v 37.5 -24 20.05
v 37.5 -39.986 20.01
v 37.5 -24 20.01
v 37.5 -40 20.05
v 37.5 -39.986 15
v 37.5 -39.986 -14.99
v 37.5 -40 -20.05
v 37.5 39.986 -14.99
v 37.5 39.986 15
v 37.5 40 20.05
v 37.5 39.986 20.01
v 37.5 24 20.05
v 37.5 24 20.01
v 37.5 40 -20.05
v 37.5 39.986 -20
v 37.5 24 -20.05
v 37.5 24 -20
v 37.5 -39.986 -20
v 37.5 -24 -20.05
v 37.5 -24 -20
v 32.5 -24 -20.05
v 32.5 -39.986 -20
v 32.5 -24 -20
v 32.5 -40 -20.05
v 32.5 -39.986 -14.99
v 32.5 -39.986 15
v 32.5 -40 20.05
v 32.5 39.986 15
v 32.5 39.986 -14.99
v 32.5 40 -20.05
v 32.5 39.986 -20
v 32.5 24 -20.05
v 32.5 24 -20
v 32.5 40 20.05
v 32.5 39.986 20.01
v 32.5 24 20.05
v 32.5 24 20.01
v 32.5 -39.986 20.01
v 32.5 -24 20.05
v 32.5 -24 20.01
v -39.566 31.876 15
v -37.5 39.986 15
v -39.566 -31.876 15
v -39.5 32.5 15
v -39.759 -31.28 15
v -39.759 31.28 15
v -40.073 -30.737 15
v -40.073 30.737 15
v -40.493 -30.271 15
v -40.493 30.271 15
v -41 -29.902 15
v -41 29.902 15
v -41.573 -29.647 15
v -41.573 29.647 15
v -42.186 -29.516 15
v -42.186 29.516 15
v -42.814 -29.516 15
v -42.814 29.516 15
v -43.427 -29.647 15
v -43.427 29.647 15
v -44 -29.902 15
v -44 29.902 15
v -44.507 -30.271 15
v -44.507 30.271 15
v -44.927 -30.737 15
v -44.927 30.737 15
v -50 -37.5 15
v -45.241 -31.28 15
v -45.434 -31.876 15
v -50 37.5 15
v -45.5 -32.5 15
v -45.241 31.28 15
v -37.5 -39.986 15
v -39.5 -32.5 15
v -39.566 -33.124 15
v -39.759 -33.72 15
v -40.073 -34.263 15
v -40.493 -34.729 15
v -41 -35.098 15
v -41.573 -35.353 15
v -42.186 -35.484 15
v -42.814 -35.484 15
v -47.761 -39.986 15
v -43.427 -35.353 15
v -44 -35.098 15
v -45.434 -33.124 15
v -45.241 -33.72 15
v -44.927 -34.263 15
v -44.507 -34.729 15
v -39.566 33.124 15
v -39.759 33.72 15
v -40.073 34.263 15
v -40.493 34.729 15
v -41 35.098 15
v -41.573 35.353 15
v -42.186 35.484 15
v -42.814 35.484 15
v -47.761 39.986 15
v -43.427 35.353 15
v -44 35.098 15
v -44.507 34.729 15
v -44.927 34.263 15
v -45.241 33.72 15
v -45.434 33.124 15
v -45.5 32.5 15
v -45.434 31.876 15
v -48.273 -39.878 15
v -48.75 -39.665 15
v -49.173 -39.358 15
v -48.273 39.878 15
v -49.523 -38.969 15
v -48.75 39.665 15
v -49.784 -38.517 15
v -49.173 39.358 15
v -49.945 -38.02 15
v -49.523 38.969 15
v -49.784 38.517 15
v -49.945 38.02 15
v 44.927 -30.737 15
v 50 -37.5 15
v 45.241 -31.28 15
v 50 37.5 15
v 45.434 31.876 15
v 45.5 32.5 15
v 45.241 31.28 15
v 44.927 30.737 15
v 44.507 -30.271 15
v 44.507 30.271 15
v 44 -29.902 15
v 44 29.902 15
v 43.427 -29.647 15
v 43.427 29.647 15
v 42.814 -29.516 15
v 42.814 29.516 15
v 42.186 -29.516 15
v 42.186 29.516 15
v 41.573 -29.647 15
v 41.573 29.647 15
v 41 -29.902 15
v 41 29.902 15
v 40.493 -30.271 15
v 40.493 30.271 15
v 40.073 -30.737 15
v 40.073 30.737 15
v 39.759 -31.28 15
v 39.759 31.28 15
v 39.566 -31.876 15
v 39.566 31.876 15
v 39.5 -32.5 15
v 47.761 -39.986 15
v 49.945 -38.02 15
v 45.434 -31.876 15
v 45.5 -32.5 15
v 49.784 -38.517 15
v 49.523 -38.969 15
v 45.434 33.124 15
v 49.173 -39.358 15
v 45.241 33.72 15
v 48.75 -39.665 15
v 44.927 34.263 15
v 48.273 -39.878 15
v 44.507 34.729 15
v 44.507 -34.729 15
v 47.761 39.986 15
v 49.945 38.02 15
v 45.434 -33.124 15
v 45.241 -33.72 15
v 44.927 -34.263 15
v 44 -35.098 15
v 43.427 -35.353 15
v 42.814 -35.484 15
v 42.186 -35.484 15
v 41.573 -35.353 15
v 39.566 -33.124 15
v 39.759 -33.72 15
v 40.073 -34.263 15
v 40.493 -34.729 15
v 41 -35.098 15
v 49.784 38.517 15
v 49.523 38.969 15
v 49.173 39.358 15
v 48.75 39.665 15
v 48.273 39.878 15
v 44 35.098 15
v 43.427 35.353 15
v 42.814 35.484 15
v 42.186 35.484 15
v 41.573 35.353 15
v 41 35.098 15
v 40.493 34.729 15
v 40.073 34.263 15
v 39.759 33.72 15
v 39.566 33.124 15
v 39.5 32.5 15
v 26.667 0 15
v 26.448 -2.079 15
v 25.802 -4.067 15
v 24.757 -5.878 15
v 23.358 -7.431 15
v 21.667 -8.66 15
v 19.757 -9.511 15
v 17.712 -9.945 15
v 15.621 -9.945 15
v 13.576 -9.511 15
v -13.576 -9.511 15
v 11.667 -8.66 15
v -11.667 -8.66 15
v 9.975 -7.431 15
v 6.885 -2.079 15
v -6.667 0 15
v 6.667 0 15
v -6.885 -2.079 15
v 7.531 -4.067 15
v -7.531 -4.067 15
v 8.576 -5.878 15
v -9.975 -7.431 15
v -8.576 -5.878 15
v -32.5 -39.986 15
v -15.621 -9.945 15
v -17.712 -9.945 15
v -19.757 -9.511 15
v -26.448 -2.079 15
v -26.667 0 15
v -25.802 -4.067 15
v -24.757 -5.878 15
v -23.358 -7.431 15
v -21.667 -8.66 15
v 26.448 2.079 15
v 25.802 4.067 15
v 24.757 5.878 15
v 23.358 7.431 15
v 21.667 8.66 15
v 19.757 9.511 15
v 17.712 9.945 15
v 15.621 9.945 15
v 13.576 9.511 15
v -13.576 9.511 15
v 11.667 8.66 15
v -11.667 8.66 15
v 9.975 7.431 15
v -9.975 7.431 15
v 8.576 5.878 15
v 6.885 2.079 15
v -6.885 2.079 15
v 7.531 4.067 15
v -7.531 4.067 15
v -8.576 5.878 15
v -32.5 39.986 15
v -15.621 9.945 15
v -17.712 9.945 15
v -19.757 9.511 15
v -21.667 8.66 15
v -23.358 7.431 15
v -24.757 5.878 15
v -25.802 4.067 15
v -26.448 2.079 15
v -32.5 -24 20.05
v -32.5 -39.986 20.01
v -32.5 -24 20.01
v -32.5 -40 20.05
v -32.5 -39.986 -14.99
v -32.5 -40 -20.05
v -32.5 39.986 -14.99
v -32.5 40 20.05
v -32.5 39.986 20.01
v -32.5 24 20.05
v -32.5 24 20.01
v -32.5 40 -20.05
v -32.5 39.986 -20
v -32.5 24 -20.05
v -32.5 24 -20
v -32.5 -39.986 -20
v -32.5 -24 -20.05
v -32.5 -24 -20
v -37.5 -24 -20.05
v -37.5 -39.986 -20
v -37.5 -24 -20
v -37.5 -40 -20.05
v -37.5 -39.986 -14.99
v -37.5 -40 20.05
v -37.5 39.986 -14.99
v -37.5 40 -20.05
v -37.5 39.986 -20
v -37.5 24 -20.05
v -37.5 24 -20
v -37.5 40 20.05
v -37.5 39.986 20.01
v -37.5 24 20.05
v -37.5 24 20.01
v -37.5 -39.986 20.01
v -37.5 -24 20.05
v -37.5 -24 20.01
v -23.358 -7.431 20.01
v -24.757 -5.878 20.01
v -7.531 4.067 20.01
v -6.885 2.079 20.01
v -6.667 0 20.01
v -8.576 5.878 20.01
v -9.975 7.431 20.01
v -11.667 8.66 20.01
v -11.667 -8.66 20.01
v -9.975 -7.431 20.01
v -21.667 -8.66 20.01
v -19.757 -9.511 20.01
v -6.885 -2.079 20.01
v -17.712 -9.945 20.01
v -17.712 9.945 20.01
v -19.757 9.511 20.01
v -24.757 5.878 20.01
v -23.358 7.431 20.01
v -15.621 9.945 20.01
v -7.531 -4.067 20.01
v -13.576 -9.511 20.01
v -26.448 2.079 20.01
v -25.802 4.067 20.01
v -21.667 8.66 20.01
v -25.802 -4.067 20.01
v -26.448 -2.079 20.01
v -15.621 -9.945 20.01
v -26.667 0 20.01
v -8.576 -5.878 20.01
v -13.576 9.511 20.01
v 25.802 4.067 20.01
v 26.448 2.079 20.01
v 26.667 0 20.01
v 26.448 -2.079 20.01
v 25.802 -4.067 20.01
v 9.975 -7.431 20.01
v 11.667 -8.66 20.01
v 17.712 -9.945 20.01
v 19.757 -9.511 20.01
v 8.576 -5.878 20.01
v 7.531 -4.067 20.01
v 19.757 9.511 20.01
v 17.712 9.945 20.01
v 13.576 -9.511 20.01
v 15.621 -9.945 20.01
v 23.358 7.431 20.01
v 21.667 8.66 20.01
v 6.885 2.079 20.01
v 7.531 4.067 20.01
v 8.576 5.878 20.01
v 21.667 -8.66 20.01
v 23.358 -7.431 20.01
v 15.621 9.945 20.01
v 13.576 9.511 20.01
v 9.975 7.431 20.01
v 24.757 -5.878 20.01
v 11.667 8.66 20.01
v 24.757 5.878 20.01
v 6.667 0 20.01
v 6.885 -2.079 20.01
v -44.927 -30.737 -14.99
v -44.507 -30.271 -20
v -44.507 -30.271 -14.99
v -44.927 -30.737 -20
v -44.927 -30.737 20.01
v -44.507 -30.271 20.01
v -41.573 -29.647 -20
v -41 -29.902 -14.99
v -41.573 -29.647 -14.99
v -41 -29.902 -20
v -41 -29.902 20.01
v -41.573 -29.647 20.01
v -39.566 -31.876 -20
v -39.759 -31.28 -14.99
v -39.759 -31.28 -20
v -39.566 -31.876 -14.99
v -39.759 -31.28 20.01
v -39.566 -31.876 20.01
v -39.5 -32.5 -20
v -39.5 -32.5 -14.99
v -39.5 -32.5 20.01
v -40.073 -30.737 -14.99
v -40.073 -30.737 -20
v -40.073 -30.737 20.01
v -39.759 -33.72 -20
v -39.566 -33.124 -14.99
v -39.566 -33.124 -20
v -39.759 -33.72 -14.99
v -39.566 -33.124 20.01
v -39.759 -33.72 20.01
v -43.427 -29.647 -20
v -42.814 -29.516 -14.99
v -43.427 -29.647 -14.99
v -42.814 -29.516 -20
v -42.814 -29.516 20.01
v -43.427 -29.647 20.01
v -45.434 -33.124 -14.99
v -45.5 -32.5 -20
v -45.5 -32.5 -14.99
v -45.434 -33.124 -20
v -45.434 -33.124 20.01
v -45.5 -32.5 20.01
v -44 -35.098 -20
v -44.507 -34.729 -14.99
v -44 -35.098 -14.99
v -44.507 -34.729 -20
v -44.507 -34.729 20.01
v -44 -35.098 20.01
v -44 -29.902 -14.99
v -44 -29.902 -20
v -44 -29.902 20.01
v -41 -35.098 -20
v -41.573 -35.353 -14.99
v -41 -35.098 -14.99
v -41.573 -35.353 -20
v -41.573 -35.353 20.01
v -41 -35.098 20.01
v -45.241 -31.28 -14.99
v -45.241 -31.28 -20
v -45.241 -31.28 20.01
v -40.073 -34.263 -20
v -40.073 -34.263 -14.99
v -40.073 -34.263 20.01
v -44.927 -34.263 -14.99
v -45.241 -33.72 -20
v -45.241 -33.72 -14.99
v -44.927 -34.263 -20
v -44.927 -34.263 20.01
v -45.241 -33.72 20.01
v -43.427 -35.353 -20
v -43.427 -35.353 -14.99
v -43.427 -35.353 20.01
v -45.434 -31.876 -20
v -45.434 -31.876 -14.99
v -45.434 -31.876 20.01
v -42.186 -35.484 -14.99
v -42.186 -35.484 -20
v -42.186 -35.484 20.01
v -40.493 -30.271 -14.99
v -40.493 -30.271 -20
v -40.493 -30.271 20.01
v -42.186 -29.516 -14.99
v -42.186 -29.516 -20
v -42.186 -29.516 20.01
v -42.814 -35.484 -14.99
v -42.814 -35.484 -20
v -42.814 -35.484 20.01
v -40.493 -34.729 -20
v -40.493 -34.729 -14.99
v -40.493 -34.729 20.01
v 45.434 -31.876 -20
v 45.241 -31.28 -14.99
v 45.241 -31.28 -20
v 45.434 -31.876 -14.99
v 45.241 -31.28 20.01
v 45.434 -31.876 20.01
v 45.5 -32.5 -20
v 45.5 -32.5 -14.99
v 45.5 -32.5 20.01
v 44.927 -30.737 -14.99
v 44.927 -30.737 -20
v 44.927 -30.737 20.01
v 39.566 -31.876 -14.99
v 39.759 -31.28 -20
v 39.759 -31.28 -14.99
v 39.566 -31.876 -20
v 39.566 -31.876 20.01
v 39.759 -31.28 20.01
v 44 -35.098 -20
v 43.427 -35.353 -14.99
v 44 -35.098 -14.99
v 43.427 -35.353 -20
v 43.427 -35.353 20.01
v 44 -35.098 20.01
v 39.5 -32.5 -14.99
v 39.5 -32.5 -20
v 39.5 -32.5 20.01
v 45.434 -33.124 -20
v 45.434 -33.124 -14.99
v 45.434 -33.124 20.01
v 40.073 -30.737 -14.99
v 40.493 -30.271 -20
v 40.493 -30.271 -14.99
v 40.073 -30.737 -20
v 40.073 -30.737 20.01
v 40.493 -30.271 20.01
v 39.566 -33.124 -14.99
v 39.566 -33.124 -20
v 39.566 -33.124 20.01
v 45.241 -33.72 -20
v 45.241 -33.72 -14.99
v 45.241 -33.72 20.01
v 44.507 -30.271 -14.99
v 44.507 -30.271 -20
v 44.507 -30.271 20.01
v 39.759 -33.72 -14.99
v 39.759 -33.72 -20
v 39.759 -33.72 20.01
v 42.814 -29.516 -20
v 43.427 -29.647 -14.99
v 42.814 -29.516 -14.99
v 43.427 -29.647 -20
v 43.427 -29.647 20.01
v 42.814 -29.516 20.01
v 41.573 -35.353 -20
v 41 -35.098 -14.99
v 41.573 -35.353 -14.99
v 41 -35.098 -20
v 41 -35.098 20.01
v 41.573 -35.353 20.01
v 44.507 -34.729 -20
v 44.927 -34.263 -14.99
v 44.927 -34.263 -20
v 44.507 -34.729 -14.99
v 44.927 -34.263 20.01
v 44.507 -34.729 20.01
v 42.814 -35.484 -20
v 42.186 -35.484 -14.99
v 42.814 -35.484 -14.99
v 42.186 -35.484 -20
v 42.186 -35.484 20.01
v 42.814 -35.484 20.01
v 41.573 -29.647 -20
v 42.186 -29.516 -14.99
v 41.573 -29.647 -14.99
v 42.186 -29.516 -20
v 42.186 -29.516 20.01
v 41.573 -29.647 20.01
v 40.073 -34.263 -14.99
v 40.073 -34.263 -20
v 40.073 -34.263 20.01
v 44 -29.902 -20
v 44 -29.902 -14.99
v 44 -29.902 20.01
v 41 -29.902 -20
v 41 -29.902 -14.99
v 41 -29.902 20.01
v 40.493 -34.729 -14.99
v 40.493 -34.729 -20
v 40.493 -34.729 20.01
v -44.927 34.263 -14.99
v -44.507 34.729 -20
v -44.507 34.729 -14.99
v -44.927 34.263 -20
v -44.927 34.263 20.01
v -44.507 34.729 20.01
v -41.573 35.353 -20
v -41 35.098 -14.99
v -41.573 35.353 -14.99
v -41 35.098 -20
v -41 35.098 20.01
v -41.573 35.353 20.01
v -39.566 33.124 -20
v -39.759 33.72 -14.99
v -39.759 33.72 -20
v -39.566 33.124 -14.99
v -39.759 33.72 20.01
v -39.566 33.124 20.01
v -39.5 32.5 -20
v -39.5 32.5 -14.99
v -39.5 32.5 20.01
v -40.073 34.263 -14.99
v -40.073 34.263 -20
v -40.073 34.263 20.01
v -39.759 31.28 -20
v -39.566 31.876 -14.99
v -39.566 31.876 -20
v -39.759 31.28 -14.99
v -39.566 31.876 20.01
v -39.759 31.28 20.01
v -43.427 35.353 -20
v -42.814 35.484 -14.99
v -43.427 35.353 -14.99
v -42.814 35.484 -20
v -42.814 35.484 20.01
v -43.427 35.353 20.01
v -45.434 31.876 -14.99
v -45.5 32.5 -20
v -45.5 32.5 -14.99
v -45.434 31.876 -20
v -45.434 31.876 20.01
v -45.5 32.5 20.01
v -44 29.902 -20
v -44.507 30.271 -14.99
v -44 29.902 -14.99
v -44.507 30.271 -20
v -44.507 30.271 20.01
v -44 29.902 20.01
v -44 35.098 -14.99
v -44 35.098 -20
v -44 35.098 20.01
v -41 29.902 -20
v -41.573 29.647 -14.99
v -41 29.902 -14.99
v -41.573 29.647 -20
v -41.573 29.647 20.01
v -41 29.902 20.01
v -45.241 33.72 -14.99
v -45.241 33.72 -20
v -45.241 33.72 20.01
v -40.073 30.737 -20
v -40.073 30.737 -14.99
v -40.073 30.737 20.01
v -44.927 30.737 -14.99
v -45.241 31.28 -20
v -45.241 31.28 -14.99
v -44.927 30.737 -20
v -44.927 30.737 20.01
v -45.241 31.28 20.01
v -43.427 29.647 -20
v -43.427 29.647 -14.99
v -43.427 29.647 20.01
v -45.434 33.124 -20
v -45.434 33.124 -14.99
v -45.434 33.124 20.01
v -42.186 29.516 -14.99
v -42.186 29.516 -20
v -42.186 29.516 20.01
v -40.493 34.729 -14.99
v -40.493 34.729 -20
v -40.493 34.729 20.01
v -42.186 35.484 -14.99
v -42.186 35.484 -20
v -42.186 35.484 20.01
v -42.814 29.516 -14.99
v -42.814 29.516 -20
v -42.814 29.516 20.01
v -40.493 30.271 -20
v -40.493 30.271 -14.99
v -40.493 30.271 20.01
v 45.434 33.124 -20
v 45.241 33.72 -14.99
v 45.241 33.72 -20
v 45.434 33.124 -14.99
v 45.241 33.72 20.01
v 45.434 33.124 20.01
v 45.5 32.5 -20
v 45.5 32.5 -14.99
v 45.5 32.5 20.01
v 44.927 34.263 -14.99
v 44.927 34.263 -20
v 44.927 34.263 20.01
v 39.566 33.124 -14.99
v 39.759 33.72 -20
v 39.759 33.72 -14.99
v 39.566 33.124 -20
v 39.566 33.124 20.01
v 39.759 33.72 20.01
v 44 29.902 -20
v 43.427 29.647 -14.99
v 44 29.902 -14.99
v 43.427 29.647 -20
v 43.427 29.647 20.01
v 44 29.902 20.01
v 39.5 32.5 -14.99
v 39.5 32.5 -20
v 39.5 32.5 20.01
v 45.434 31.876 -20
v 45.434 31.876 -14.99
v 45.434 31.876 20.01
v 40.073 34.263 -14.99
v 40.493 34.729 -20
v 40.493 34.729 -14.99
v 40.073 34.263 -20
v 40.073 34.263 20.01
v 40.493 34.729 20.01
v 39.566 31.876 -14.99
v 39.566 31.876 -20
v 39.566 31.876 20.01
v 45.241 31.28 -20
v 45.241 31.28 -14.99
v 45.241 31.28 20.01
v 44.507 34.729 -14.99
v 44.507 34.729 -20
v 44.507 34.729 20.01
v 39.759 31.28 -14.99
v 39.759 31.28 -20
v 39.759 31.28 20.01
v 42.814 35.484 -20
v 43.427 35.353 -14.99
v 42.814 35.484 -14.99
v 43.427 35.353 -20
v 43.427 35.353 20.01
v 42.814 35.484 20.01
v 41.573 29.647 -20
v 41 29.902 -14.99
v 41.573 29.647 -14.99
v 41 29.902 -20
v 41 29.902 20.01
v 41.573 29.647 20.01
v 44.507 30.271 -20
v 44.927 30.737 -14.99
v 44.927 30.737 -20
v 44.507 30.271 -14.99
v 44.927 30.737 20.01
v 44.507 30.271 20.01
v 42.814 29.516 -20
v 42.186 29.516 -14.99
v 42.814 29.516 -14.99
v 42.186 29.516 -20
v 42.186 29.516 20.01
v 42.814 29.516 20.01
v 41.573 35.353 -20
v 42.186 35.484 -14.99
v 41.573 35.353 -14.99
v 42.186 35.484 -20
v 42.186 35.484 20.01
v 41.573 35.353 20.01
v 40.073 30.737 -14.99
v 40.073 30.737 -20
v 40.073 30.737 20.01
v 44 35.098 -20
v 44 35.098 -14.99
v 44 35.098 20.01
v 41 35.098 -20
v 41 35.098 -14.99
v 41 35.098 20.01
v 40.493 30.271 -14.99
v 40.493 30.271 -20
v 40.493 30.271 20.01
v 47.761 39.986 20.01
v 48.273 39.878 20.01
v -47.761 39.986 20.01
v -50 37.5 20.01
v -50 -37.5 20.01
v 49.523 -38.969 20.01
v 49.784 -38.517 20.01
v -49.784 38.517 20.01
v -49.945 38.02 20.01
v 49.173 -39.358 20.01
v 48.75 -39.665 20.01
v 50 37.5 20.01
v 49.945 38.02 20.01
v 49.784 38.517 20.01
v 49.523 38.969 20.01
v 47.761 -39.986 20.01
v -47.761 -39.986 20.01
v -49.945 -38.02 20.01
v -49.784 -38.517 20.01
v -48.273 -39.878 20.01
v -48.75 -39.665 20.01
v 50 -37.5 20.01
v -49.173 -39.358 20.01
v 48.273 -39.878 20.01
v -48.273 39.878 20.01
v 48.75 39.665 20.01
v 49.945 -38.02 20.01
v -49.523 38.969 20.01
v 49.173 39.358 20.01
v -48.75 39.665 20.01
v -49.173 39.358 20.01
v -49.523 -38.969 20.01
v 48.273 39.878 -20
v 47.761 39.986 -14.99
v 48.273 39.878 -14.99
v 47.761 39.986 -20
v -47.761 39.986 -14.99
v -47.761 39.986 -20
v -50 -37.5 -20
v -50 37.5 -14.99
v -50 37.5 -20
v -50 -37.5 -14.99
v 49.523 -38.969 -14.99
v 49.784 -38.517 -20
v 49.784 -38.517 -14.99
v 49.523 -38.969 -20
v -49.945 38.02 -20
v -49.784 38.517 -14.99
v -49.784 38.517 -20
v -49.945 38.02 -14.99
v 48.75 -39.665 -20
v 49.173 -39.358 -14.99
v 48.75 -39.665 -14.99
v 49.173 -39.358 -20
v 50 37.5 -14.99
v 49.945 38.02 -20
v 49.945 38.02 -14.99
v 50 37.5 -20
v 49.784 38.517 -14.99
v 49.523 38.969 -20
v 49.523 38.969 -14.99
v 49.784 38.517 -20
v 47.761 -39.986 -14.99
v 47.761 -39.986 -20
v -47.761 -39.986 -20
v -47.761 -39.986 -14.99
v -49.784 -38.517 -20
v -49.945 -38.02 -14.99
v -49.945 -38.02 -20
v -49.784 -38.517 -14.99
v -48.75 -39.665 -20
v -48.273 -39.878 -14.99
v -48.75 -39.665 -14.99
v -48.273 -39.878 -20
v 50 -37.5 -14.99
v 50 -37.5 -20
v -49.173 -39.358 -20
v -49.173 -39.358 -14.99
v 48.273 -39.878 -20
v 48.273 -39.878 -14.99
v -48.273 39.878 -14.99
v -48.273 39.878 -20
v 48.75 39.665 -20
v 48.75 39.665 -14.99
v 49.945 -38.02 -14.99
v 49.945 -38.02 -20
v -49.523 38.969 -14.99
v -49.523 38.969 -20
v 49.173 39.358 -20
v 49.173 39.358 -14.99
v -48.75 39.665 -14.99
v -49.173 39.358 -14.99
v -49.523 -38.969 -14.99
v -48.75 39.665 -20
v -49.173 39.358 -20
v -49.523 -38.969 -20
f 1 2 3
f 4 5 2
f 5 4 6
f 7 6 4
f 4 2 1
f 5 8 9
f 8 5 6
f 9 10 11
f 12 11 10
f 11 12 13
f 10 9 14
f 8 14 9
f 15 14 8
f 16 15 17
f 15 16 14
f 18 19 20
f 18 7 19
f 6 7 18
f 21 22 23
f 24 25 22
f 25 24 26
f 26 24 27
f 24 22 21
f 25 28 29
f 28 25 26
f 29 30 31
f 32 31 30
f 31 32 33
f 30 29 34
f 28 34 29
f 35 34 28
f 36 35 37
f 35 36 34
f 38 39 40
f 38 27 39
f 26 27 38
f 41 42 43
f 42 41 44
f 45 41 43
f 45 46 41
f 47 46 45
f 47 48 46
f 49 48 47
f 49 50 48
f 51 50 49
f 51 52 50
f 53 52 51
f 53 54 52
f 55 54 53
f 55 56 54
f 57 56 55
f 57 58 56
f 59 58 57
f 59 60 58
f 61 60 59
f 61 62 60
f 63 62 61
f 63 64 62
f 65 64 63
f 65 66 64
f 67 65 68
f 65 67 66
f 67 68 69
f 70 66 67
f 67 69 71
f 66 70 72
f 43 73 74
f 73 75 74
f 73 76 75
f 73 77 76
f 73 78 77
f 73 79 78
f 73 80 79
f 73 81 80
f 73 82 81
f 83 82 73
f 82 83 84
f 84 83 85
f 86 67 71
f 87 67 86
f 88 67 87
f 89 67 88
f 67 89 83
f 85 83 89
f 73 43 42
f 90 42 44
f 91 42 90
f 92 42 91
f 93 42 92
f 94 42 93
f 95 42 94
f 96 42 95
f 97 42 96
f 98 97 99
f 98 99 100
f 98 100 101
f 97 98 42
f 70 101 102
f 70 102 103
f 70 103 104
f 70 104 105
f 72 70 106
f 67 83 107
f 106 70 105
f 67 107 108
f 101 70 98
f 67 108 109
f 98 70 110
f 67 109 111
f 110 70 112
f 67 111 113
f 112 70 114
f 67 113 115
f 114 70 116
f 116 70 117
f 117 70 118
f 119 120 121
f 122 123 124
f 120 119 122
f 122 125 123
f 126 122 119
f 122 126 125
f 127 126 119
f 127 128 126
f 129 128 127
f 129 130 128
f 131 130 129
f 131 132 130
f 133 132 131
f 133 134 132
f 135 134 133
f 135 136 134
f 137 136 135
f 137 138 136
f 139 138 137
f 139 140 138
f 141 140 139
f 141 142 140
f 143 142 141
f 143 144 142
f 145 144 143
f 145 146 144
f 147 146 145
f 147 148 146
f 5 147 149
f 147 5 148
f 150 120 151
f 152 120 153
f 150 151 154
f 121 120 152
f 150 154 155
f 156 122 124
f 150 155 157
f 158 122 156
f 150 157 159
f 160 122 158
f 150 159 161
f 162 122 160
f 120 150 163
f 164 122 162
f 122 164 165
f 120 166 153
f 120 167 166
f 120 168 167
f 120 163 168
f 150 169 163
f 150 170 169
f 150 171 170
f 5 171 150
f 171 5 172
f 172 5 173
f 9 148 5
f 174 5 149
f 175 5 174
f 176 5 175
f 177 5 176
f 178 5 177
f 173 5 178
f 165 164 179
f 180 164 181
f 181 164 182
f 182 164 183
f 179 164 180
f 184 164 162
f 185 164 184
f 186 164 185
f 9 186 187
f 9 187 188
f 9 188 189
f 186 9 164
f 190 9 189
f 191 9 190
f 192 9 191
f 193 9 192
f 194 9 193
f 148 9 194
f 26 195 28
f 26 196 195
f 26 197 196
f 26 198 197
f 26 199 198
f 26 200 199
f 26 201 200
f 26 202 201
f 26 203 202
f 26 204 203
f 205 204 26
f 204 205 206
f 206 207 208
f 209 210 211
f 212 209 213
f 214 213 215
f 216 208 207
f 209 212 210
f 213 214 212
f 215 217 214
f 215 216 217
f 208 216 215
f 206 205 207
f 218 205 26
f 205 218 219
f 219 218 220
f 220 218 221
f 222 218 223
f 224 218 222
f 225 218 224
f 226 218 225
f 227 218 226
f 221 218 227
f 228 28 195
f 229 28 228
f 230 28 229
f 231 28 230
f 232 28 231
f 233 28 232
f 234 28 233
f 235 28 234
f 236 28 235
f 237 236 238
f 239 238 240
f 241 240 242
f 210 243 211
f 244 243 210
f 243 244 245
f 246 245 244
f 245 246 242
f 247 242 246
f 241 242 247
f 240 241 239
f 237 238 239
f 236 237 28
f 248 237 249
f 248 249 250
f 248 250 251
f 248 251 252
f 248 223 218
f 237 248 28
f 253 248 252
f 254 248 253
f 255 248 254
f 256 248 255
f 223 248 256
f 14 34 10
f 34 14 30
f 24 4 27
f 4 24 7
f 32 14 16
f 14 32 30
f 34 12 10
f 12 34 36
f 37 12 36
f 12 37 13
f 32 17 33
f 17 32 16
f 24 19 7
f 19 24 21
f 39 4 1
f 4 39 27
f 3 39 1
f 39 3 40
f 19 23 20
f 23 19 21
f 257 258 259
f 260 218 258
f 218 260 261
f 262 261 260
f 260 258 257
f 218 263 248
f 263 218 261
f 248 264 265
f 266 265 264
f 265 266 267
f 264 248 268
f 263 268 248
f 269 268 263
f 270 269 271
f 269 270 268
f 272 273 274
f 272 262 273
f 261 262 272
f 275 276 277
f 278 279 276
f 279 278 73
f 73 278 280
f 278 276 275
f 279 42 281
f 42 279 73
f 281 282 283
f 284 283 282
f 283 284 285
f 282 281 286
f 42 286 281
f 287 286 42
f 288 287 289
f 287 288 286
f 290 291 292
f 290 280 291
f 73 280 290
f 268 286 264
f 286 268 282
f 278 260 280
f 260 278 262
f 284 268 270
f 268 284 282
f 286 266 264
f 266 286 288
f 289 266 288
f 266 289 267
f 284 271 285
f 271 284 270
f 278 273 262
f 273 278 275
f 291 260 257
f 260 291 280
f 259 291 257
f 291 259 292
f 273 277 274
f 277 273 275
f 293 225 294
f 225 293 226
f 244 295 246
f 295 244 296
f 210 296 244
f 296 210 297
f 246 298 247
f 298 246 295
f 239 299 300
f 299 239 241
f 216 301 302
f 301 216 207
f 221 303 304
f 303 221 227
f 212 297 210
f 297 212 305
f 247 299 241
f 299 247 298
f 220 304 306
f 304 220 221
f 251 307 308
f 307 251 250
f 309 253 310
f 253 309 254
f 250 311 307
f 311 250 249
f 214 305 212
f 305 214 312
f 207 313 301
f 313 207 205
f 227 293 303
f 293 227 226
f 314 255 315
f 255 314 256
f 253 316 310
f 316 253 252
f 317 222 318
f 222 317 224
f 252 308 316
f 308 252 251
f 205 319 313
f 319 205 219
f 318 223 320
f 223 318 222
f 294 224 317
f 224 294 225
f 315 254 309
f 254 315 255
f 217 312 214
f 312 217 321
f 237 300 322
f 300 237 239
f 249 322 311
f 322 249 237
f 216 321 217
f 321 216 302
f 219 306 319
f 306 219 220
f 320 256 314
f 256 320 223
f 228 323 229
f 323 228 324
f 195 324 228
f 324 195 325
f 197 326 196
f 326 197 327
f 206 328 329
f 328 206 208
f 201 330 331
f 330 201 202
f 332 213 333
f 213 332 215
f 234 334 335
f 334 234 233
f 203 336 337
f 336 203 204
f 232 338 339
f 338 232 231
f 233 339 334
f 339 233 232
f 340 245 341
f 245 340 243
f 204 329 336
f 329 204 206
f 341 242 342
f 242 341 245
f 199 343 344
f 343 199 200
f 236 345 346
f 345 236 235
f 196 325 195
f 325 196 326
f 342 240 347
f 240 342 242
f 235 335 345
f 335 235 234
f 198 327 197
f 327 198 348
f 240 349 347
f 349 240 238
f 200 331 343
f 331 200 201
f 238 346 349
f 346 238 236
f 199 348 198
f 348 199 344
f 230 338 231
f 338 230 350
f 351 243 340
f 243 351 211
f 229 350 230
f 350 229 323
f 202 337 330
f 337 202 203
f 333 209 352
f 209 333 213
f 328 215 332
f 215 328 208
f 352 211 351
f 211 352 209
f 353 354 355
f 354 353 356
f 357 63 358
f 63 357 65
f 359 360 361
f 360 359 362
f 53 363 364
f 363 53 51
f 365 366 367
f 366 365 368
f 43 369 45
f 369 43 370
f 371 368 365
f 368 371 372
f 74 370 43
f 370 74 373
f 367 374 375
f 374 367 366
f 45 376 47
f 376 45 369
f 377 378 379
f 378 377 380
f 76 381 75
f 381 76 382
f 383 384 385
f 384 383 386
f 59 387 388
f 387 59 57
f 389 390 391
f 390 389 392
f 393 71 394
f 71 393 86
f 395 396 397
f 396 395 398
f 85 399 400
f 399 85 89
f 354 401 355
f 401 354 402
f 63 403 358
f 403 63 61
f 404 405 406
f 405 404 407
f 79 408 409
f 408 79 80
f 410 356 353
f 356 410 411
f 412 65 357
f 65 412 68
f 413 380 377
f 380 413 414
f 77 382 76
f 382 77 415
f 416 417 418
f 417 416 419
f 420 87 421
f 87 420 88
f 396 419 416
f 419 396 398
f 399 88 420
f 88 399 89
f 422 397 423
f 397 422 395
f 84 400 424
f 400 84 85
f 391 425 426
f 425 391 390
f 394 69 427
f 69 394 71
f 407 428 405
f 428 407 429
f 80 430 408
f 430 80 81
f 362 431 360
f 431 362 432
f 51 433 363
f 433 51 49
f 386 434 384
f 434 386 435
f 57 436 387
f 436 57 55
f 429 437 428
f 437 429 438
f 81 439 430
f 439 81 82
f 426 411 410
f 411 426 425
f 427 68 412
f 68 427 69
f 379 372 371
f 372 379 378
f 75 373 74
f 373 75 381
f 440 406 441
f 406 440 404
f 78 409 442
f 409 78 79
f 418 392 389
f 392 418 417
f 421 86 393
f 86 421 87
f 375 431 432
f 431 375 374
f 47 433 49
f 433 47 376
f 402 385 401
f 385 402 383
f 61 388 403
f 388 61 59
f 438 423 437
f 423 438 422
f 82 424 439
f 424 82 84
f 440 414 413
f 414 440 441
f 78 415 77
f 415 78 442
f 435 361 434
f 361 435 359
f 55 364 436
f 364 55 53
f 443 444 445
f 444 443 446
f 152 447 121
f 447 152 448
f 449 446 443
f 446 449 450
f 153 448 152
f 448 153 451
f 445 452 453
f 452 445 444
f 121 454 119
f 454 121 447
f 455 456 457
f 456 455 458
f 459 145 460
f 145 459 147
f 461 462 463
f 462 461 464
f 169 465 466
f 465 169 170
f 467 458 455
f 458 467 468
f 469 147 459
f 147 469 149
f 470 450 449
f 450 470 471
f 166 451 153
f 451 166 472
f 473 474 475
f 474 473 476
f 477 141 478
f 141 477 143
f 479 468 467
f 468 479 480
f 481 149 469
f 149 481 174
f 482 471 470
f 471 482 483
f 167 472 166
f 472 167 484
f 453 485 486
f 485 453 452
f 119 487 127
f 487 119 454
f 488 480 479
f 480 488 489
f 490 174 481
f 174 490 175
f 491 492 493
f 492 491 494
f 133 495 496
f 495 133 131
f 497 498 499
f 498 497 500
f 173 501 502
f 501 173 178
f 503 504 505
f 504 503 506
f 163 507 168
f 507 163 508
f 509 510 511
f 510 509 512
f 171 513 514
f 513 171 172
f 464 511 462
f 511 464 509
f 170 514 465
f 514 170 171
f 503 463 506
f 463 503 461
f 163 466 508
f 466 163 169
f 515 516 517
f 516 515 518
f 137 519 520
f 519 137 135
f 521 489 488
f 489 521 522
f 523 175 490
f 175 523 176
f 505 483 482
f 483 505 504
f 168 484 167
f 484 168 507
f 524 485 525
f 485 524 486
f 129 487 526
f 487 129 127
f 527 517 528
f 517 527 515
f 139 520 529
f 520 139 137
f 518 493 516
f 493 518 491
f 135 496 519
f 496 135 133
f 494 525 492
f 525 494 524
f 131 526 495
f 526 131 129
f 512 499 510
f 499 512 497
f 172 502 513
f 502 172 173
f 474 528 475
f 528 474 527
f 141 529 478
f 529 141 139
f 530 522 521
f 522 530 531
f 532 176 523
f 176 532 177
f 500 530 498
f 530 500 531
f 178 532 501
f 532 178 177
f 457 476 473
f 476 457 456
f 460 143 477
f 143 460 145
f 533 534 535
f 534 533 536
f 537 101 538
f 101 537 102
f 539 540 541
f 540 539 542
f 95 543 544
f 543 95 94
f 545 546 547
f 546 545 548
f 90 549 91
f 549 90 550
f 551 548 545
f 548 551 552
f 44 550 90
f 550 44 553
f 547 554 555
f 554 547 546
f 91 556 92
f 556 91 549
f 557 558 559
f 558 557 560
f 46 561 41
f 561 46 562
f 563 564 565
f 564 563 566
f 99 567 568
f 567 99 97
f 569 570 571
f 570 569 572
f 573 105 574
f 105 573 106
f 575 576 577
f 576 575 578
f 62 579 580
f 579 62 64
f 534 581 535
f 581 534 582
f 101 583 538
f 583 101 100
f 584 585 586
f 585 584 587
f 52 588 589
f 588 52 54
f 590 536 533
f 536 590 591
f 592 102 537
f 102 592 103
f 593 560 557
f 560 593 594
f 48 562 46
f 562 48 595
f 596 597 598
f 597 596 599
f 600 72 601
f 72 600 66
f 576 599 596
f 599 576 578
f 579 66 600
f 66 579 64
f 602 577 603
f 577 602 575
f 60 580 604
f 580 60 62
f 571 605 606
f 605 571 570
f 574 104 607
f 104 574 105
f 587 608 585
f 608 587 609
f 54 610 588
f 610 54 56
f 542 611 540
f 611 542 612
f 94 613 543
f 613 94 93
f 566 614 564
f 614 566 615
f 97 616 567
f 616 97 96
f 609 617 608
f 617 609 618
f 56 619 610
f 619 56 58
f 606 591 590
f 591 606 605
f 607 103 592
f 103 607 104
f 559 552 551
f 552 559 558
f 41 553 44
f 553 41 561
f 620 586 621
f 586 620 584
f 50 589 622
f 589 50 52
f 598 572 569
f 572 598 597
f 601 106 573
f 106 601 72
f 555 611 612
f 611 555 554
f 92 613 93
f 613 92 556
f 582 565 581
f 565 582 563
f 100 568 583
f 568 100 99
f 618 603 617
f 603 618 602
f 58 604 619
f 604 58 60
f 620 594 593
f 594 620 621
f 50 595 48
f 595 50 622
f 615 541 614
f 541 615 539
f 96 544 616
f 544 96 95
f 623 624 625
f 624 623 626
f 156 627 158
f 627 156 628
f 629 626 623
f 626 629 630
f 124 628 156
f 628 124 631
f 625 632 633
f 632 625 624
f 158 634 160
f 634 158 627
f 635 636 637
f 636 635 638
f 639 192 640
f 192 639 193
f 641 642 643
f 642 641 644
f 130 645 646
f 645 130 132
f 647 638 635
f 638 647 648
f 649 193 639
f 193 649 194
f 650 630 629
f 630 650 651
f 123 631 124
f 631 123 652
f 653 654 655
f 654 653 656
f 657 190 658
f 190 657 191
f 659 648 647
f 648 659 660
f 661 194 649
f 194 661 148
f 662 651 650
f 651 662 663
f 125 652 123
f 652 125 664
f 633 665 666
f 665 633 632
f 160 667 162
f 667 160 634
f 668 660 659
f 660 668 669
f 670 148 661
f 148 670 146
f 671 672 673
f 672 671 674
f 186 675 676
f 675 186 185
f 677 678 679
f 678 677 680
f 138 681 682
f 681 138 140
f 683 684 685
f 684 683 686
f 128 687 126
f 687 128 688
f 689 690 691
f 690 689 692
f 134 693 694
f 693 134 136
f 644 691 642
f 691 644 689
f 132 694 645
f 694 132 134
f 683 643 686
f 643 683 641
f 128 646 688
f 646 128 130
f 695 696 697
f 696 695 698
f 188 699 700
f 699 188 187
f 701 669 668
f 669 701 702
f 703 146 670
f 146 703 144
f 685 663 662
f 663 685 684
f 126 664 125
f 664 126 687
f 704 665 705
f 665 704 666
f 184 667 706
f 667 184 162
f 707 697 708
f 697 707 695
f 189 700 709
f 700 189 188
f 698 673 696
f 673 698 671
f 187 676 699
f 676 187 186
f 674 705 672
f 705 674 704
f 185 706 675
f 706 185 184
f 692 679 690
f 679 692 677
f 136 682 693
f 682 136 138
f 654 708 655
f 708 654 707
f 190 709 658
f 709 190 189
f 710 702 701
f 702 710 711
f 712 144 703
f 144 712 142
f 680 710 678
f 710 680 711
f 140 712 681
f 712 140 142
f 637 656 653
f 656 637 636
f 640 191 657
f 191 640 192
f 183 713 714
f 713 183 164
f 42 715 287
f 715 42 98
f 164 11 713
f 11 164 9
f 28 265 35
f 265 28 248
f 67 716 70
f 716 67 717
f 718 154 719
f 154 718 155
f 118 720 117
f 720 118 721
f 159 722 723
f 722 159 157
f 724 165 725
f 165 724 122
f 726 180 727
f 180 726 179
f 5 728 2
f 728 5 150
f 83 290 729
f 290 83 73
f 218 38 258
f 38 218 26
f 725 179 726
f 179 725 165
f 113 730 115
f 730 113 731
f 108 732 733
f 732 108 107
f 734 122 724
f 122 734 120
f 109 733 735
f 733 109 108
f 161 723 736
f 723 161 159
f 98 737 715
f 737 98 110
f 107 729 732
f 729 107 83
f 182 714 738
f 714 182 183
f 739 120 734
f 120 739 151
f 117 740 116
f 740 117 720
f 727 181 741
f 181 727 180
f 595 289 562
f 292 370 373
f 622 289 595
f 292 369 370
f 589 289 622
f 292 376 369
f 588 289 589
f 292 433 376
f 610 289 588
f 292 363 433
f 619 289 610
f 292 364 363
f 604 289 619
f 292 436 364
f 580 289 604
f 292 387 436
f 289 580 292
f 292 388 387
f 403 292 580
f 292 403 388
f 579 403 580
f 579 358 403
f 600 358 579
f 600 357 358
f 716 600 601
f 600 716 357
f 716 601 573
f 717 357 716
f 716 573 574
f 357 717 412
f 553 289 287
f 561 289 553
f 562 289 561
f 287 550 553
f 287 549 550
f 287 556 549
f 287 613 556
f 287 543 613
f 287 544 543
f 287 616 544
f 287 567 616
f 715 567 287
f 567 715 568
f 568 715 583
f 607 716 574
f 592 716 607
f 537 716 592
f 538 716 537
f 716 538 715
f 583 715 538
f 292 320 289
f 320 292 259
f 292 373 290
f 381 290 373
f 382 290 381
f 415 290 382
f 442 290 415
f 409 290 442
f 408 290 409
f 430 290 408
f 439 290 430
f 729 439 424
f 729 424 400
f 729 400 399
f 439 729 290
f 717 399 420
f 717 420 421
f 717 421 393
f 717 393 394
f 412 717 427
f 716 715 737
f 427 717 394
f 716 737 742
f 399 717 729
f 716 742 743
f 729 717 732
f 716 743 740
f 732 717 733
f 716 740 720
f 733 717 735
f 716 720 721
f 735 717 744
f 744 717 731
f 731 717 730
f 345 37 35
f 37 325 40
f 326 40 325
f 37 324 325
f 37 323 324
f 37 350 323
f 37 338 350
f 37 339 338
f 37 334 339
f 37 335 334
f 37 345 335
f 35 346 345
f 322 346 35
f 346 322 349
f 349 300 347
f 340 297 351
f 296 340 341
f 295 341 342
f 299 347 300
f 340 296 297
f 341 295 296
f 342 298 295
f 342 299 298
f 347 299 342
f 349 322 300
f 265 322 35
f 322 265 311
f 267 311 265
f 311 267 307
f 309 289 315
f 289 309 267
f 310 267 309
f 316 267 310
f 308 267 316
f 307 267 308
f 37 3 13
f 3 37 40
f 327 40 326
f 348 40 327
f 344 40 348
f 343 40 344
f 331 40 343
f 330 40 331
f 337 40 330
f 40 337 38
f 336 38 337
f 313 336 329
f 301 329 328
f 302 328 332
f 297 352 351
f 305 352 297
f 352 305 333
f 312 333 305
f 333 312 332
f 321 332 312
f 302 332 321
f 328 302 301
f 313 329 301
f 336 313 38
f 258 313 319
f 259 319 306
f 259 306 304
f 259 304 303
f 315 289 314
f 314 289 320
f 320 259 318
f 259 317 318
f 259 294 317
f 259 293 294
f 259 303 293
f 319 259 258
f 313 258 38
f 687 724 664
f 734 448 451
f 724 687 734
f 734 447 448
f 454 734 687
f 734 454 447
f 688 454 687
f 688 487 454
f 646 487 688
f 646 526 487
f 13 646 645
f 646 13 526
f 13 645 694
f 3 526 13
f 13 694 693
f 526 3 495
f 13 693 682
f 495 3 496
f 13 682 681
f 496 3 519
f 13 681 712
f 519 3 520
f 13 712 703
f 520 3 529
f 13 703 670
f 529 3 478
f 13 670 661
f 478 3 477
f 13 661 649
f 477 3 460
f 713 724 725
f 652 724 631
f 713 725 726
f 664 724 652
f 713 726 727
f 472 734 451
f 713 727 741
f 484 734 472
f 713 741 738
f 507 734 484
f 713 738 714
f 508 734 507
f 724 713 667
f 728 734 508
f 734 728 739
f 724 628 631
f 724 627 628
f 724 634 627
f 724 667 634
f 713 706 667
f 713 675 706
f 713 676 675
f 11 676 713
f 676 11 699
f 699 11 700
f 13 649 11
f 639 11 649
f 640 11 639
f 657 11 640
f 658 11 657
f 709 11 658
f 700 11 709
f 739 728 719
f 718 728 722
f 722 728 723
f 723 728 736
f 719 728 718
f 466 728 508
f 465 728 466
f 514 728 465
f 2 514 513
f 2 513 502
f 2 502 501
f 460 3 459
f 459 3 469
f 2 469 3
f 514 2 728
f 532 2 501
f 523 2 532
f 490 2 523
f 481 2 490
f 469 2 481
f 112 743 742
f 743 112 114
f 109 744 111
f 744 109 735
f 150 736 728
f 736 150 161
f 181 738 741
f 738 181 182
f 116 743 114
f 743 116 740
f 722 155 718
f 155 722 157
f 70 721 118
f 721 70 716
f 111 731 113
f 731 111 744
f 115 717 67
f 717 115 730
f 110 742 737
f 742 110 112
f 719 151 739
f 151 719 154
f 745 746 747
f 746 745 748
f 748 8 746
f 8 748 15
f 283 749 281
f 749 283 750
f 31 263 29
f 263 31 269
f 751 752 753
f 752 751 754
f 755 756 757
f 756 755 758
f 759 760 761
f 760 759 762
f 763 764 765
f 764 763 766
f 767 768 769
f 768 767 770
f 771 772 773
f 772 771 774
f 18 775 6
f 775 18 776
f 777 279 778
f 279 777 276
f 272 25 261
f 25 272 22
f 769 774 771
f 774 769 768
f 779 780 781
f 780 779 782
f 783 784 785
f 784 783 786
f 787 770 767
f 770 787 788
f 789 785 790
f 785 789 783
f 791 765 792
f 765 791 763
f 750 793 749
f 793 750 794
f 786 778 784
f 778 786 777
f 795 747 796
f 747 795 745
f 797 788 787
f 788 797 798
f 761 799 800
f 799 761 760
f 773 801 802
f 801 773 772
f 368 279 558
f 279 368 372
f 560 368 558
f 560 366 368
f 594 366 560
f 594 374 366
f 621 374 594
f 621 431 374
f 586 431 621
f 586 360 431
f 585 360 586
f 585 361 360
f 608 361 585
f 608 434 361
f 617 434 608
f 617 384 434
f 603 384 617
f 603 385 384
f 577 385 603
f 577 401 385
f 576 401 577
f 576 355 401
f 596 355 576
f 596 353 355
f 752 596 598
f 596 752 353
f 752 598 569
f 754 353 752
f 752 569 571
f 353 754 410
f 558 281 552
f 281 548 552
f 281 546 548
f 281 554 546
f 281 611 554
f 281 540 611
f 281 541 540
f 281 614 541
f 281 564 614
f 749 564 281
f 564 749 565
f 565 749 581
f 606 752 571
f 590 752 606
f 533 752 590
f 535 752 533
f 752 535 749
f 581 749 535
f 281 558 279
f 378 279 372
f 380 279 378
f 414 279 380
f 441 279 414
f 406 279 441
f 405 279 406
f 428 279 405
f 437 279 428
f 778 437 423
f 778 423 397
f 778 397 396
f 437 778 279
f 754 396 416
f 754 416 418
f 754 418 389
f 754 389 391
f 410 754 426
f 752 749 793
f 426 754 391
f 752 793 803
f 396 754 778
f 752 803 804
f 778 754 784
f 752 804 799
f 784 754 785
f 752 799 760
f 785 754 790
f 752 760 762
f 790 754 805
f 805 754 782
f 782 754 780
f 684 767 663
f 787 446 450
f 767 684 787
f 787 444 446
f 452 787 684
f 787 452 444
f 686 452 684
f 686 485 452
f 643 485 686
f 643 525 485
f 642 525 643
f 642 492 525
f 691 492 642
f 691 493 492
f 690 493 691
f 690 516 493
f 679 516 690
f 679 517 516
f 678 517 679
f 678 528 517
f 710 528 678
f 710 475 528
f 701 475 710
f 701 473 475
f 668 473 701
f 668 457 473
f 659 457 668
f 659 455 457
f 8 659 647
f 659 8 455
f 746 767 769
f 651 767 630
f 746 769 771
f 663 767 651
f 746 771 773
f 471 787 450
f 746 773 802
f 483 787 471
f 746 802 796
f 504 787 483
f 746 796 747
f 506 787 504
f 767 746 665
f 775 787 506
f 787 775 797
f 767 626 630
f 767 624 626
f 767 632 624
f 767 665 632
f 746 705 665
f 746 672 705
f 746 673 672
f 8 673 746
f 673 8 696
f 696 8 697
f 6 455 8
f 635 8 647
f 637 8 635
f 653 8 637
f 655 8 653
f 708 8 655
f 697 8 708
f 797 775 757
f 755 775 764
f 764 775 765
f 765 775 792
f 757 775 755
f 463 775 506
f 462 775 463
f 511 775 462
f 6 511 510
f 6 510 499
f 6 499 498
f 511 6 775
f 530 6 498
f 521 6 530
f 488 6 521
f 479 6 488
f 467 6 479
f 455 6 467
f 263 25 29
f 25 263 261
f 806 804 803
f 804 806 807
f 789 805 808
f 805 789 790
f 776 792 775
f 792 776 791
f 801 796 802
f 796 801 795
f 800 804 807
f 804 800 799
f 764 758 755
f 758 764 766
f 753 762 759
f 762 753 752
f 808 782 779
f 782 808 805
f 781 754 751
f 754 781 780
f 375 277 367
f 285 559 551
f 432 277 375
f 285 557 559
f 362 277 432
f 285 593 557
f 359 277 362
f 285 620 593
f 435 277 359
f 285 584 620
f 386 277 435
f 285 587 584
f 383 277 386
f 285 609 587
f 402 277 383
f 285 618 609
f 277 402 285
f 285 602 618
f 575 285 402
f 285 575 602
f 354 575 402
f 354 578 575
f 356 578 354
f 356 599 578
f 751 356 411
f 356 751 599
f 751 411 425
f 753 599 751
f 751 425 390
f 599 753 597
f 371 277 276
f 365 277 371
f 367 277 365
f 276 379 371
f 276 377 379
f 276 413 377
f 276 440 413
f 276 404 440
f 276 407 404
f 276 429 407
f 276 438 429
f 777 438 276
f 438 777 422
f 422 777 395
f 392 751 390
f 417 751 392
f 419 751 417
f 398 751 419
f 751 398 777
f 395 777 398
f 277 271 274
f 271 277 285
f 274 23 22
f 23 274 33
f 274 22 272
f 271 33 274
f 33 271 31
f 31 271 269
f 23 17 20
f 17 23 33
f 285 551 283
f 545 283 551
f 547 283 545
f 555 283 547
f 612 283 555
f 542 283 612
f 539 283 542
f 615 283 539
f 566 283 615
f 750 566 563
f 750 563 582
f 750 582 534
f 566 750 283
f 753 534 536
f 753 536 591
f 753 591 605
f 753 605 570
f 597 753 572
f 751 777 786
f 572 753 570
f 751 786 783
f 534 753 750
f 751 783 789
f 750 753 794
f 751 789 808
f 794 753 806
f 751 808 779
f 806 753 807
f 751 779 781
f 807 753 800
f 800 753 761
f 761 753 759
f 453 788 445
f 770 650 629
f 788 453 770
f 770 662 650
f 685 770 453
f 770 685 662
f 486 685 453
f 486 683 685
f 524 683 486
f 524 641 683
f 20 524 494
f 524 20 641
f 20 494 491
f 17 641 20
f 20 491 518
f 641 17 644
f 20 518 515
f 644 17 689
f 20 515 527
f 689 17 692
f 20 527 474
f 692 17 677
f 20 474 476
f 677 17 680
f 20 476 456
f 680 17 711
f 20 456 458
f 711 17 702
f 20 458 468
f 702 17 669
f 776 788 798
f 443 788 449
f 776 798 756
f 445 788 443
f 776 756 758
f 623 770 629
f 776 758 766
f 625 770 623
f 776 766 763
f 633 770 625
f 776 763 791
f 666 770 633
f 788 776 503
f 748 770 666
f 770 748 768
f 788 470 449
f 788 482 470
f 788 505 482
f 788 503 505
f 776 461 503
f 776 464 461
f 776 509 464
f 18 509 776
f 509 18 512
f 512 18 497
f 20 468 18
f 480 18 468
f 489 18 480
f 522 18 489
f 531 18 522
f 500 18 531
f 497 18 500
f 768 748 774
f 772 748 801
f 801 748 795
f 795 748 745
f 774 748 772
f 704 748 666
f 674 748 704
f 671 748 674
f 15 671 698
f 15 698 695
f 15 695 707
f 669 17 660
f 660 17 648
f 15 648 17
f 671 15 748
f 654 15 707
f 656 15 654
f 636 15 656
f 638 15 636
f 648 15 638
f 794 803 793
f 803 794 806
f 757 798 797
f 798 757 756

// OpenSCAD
///////////////////////////////////////////////
//simple case to show boolean method of creating parts for laser/cnc cutting
//Matt Venn 2013, releases under an open source license.
//mattvenn.net

//smooth curves
$fs=0.5;

//fundamental measurements, these are things we can't change
button_r = 7;
bolt_r = 3;

//how big we want the case
width=100;
height=40;
length=80;

//some adjustable parameters
thickness = 5; //material thickness
spacing = 15;

///////////////////////////////////////////////
//show where the bits of the case are
build_front();
build_back();
build_side_l();
build_side_r();
//build_buttons();
//build_bolts();

//to make dxfs, uncomment these
//projection() build_front();
//projection() build_back();
//projection() rotate([0,90,0]) build_side_l();

///////////////////////////////////////////////
//the models: these are built at the 0,0,0 point and are all centered

module short_side()
{
   slot_length = length / 5;
   cube([height-2*thickness,length,thickness],center=true); 
   translate([0,length/2-slot_length/2,0])
       cube([height+0.1,slot_length,thickness],center=true);
   translate([0,-length/2+slot_length/2,0])
       cube([height+0.1,slot_length,thickness],center=true);
}

module front_or_back()
{
    mink_r = thickness/2;
    minkowski()
    {
        //have to take into account the radius of the cylinder, so subtract from width and length
        cube([width-mink_r*2,length-mink_r*2,thickness],center=true);
        cylinder(r=thickness/2,h=0.01);
    }
}

///////////////////////////////////////////////
//the models moved to the correct position, and with intersecting parts cut out of them using difference()
module build_front()
{
    difference()
    {
        translate([0,0,height/2-thickness/2])
            front_or_back();
        build_side_r();
        build_side_l();
        build_buttons();
        build_bolts();
    }
}
module build_back()
{
    difference()
    {
        translate([0,0,-height/2+thickness/2])
            front_or_back();
        build_side_r();
        build_side_l();
        build_bolts();
    }
}

module build_side_r()
{
    color("grey")
        translate([+width/2-spacing,0,0])
            rotate([0,90,0])
                short_side();
}

module build_side_l()
{
    color("grey")
        translate([-width/2+spacing,0,0])
            rotate([0,90,0])
                short_side();
}

///////////////////////////////////////////////
//so simple and we're never going to cut these parts, that we combine the build and model in one module
module build_buttons()
{
    color("blue")
    {
        translate([-width/6,0,height/2])
            cylinder(r=10,h=20,center=true);
        translate([+width/6,0,height/2])
            cylinder(r=10,h=20,center=true);
    }
}

module build_bolts()
{
    translate([-width/2+spacing/2,-length/2+spacing/2,0])
        cylinder(r=bolt_r,h=height*1.5,center=true);
    translate([+width/2-spacing/2,-length/2+spacing/2,0])
        cylinder(r=bolt_r,h=height*1.5,center=true);
    translate([-width/2+spacing/2,+length/2-spacing/2,0])
        cylinder(r=bolt_r,h=height*1.5,center=true);
    translate([+width/2-spacing/2,+length/2-spacing/2,0])
        cylinder(r=bolt_r,h=height*1.5,center=true);
}
